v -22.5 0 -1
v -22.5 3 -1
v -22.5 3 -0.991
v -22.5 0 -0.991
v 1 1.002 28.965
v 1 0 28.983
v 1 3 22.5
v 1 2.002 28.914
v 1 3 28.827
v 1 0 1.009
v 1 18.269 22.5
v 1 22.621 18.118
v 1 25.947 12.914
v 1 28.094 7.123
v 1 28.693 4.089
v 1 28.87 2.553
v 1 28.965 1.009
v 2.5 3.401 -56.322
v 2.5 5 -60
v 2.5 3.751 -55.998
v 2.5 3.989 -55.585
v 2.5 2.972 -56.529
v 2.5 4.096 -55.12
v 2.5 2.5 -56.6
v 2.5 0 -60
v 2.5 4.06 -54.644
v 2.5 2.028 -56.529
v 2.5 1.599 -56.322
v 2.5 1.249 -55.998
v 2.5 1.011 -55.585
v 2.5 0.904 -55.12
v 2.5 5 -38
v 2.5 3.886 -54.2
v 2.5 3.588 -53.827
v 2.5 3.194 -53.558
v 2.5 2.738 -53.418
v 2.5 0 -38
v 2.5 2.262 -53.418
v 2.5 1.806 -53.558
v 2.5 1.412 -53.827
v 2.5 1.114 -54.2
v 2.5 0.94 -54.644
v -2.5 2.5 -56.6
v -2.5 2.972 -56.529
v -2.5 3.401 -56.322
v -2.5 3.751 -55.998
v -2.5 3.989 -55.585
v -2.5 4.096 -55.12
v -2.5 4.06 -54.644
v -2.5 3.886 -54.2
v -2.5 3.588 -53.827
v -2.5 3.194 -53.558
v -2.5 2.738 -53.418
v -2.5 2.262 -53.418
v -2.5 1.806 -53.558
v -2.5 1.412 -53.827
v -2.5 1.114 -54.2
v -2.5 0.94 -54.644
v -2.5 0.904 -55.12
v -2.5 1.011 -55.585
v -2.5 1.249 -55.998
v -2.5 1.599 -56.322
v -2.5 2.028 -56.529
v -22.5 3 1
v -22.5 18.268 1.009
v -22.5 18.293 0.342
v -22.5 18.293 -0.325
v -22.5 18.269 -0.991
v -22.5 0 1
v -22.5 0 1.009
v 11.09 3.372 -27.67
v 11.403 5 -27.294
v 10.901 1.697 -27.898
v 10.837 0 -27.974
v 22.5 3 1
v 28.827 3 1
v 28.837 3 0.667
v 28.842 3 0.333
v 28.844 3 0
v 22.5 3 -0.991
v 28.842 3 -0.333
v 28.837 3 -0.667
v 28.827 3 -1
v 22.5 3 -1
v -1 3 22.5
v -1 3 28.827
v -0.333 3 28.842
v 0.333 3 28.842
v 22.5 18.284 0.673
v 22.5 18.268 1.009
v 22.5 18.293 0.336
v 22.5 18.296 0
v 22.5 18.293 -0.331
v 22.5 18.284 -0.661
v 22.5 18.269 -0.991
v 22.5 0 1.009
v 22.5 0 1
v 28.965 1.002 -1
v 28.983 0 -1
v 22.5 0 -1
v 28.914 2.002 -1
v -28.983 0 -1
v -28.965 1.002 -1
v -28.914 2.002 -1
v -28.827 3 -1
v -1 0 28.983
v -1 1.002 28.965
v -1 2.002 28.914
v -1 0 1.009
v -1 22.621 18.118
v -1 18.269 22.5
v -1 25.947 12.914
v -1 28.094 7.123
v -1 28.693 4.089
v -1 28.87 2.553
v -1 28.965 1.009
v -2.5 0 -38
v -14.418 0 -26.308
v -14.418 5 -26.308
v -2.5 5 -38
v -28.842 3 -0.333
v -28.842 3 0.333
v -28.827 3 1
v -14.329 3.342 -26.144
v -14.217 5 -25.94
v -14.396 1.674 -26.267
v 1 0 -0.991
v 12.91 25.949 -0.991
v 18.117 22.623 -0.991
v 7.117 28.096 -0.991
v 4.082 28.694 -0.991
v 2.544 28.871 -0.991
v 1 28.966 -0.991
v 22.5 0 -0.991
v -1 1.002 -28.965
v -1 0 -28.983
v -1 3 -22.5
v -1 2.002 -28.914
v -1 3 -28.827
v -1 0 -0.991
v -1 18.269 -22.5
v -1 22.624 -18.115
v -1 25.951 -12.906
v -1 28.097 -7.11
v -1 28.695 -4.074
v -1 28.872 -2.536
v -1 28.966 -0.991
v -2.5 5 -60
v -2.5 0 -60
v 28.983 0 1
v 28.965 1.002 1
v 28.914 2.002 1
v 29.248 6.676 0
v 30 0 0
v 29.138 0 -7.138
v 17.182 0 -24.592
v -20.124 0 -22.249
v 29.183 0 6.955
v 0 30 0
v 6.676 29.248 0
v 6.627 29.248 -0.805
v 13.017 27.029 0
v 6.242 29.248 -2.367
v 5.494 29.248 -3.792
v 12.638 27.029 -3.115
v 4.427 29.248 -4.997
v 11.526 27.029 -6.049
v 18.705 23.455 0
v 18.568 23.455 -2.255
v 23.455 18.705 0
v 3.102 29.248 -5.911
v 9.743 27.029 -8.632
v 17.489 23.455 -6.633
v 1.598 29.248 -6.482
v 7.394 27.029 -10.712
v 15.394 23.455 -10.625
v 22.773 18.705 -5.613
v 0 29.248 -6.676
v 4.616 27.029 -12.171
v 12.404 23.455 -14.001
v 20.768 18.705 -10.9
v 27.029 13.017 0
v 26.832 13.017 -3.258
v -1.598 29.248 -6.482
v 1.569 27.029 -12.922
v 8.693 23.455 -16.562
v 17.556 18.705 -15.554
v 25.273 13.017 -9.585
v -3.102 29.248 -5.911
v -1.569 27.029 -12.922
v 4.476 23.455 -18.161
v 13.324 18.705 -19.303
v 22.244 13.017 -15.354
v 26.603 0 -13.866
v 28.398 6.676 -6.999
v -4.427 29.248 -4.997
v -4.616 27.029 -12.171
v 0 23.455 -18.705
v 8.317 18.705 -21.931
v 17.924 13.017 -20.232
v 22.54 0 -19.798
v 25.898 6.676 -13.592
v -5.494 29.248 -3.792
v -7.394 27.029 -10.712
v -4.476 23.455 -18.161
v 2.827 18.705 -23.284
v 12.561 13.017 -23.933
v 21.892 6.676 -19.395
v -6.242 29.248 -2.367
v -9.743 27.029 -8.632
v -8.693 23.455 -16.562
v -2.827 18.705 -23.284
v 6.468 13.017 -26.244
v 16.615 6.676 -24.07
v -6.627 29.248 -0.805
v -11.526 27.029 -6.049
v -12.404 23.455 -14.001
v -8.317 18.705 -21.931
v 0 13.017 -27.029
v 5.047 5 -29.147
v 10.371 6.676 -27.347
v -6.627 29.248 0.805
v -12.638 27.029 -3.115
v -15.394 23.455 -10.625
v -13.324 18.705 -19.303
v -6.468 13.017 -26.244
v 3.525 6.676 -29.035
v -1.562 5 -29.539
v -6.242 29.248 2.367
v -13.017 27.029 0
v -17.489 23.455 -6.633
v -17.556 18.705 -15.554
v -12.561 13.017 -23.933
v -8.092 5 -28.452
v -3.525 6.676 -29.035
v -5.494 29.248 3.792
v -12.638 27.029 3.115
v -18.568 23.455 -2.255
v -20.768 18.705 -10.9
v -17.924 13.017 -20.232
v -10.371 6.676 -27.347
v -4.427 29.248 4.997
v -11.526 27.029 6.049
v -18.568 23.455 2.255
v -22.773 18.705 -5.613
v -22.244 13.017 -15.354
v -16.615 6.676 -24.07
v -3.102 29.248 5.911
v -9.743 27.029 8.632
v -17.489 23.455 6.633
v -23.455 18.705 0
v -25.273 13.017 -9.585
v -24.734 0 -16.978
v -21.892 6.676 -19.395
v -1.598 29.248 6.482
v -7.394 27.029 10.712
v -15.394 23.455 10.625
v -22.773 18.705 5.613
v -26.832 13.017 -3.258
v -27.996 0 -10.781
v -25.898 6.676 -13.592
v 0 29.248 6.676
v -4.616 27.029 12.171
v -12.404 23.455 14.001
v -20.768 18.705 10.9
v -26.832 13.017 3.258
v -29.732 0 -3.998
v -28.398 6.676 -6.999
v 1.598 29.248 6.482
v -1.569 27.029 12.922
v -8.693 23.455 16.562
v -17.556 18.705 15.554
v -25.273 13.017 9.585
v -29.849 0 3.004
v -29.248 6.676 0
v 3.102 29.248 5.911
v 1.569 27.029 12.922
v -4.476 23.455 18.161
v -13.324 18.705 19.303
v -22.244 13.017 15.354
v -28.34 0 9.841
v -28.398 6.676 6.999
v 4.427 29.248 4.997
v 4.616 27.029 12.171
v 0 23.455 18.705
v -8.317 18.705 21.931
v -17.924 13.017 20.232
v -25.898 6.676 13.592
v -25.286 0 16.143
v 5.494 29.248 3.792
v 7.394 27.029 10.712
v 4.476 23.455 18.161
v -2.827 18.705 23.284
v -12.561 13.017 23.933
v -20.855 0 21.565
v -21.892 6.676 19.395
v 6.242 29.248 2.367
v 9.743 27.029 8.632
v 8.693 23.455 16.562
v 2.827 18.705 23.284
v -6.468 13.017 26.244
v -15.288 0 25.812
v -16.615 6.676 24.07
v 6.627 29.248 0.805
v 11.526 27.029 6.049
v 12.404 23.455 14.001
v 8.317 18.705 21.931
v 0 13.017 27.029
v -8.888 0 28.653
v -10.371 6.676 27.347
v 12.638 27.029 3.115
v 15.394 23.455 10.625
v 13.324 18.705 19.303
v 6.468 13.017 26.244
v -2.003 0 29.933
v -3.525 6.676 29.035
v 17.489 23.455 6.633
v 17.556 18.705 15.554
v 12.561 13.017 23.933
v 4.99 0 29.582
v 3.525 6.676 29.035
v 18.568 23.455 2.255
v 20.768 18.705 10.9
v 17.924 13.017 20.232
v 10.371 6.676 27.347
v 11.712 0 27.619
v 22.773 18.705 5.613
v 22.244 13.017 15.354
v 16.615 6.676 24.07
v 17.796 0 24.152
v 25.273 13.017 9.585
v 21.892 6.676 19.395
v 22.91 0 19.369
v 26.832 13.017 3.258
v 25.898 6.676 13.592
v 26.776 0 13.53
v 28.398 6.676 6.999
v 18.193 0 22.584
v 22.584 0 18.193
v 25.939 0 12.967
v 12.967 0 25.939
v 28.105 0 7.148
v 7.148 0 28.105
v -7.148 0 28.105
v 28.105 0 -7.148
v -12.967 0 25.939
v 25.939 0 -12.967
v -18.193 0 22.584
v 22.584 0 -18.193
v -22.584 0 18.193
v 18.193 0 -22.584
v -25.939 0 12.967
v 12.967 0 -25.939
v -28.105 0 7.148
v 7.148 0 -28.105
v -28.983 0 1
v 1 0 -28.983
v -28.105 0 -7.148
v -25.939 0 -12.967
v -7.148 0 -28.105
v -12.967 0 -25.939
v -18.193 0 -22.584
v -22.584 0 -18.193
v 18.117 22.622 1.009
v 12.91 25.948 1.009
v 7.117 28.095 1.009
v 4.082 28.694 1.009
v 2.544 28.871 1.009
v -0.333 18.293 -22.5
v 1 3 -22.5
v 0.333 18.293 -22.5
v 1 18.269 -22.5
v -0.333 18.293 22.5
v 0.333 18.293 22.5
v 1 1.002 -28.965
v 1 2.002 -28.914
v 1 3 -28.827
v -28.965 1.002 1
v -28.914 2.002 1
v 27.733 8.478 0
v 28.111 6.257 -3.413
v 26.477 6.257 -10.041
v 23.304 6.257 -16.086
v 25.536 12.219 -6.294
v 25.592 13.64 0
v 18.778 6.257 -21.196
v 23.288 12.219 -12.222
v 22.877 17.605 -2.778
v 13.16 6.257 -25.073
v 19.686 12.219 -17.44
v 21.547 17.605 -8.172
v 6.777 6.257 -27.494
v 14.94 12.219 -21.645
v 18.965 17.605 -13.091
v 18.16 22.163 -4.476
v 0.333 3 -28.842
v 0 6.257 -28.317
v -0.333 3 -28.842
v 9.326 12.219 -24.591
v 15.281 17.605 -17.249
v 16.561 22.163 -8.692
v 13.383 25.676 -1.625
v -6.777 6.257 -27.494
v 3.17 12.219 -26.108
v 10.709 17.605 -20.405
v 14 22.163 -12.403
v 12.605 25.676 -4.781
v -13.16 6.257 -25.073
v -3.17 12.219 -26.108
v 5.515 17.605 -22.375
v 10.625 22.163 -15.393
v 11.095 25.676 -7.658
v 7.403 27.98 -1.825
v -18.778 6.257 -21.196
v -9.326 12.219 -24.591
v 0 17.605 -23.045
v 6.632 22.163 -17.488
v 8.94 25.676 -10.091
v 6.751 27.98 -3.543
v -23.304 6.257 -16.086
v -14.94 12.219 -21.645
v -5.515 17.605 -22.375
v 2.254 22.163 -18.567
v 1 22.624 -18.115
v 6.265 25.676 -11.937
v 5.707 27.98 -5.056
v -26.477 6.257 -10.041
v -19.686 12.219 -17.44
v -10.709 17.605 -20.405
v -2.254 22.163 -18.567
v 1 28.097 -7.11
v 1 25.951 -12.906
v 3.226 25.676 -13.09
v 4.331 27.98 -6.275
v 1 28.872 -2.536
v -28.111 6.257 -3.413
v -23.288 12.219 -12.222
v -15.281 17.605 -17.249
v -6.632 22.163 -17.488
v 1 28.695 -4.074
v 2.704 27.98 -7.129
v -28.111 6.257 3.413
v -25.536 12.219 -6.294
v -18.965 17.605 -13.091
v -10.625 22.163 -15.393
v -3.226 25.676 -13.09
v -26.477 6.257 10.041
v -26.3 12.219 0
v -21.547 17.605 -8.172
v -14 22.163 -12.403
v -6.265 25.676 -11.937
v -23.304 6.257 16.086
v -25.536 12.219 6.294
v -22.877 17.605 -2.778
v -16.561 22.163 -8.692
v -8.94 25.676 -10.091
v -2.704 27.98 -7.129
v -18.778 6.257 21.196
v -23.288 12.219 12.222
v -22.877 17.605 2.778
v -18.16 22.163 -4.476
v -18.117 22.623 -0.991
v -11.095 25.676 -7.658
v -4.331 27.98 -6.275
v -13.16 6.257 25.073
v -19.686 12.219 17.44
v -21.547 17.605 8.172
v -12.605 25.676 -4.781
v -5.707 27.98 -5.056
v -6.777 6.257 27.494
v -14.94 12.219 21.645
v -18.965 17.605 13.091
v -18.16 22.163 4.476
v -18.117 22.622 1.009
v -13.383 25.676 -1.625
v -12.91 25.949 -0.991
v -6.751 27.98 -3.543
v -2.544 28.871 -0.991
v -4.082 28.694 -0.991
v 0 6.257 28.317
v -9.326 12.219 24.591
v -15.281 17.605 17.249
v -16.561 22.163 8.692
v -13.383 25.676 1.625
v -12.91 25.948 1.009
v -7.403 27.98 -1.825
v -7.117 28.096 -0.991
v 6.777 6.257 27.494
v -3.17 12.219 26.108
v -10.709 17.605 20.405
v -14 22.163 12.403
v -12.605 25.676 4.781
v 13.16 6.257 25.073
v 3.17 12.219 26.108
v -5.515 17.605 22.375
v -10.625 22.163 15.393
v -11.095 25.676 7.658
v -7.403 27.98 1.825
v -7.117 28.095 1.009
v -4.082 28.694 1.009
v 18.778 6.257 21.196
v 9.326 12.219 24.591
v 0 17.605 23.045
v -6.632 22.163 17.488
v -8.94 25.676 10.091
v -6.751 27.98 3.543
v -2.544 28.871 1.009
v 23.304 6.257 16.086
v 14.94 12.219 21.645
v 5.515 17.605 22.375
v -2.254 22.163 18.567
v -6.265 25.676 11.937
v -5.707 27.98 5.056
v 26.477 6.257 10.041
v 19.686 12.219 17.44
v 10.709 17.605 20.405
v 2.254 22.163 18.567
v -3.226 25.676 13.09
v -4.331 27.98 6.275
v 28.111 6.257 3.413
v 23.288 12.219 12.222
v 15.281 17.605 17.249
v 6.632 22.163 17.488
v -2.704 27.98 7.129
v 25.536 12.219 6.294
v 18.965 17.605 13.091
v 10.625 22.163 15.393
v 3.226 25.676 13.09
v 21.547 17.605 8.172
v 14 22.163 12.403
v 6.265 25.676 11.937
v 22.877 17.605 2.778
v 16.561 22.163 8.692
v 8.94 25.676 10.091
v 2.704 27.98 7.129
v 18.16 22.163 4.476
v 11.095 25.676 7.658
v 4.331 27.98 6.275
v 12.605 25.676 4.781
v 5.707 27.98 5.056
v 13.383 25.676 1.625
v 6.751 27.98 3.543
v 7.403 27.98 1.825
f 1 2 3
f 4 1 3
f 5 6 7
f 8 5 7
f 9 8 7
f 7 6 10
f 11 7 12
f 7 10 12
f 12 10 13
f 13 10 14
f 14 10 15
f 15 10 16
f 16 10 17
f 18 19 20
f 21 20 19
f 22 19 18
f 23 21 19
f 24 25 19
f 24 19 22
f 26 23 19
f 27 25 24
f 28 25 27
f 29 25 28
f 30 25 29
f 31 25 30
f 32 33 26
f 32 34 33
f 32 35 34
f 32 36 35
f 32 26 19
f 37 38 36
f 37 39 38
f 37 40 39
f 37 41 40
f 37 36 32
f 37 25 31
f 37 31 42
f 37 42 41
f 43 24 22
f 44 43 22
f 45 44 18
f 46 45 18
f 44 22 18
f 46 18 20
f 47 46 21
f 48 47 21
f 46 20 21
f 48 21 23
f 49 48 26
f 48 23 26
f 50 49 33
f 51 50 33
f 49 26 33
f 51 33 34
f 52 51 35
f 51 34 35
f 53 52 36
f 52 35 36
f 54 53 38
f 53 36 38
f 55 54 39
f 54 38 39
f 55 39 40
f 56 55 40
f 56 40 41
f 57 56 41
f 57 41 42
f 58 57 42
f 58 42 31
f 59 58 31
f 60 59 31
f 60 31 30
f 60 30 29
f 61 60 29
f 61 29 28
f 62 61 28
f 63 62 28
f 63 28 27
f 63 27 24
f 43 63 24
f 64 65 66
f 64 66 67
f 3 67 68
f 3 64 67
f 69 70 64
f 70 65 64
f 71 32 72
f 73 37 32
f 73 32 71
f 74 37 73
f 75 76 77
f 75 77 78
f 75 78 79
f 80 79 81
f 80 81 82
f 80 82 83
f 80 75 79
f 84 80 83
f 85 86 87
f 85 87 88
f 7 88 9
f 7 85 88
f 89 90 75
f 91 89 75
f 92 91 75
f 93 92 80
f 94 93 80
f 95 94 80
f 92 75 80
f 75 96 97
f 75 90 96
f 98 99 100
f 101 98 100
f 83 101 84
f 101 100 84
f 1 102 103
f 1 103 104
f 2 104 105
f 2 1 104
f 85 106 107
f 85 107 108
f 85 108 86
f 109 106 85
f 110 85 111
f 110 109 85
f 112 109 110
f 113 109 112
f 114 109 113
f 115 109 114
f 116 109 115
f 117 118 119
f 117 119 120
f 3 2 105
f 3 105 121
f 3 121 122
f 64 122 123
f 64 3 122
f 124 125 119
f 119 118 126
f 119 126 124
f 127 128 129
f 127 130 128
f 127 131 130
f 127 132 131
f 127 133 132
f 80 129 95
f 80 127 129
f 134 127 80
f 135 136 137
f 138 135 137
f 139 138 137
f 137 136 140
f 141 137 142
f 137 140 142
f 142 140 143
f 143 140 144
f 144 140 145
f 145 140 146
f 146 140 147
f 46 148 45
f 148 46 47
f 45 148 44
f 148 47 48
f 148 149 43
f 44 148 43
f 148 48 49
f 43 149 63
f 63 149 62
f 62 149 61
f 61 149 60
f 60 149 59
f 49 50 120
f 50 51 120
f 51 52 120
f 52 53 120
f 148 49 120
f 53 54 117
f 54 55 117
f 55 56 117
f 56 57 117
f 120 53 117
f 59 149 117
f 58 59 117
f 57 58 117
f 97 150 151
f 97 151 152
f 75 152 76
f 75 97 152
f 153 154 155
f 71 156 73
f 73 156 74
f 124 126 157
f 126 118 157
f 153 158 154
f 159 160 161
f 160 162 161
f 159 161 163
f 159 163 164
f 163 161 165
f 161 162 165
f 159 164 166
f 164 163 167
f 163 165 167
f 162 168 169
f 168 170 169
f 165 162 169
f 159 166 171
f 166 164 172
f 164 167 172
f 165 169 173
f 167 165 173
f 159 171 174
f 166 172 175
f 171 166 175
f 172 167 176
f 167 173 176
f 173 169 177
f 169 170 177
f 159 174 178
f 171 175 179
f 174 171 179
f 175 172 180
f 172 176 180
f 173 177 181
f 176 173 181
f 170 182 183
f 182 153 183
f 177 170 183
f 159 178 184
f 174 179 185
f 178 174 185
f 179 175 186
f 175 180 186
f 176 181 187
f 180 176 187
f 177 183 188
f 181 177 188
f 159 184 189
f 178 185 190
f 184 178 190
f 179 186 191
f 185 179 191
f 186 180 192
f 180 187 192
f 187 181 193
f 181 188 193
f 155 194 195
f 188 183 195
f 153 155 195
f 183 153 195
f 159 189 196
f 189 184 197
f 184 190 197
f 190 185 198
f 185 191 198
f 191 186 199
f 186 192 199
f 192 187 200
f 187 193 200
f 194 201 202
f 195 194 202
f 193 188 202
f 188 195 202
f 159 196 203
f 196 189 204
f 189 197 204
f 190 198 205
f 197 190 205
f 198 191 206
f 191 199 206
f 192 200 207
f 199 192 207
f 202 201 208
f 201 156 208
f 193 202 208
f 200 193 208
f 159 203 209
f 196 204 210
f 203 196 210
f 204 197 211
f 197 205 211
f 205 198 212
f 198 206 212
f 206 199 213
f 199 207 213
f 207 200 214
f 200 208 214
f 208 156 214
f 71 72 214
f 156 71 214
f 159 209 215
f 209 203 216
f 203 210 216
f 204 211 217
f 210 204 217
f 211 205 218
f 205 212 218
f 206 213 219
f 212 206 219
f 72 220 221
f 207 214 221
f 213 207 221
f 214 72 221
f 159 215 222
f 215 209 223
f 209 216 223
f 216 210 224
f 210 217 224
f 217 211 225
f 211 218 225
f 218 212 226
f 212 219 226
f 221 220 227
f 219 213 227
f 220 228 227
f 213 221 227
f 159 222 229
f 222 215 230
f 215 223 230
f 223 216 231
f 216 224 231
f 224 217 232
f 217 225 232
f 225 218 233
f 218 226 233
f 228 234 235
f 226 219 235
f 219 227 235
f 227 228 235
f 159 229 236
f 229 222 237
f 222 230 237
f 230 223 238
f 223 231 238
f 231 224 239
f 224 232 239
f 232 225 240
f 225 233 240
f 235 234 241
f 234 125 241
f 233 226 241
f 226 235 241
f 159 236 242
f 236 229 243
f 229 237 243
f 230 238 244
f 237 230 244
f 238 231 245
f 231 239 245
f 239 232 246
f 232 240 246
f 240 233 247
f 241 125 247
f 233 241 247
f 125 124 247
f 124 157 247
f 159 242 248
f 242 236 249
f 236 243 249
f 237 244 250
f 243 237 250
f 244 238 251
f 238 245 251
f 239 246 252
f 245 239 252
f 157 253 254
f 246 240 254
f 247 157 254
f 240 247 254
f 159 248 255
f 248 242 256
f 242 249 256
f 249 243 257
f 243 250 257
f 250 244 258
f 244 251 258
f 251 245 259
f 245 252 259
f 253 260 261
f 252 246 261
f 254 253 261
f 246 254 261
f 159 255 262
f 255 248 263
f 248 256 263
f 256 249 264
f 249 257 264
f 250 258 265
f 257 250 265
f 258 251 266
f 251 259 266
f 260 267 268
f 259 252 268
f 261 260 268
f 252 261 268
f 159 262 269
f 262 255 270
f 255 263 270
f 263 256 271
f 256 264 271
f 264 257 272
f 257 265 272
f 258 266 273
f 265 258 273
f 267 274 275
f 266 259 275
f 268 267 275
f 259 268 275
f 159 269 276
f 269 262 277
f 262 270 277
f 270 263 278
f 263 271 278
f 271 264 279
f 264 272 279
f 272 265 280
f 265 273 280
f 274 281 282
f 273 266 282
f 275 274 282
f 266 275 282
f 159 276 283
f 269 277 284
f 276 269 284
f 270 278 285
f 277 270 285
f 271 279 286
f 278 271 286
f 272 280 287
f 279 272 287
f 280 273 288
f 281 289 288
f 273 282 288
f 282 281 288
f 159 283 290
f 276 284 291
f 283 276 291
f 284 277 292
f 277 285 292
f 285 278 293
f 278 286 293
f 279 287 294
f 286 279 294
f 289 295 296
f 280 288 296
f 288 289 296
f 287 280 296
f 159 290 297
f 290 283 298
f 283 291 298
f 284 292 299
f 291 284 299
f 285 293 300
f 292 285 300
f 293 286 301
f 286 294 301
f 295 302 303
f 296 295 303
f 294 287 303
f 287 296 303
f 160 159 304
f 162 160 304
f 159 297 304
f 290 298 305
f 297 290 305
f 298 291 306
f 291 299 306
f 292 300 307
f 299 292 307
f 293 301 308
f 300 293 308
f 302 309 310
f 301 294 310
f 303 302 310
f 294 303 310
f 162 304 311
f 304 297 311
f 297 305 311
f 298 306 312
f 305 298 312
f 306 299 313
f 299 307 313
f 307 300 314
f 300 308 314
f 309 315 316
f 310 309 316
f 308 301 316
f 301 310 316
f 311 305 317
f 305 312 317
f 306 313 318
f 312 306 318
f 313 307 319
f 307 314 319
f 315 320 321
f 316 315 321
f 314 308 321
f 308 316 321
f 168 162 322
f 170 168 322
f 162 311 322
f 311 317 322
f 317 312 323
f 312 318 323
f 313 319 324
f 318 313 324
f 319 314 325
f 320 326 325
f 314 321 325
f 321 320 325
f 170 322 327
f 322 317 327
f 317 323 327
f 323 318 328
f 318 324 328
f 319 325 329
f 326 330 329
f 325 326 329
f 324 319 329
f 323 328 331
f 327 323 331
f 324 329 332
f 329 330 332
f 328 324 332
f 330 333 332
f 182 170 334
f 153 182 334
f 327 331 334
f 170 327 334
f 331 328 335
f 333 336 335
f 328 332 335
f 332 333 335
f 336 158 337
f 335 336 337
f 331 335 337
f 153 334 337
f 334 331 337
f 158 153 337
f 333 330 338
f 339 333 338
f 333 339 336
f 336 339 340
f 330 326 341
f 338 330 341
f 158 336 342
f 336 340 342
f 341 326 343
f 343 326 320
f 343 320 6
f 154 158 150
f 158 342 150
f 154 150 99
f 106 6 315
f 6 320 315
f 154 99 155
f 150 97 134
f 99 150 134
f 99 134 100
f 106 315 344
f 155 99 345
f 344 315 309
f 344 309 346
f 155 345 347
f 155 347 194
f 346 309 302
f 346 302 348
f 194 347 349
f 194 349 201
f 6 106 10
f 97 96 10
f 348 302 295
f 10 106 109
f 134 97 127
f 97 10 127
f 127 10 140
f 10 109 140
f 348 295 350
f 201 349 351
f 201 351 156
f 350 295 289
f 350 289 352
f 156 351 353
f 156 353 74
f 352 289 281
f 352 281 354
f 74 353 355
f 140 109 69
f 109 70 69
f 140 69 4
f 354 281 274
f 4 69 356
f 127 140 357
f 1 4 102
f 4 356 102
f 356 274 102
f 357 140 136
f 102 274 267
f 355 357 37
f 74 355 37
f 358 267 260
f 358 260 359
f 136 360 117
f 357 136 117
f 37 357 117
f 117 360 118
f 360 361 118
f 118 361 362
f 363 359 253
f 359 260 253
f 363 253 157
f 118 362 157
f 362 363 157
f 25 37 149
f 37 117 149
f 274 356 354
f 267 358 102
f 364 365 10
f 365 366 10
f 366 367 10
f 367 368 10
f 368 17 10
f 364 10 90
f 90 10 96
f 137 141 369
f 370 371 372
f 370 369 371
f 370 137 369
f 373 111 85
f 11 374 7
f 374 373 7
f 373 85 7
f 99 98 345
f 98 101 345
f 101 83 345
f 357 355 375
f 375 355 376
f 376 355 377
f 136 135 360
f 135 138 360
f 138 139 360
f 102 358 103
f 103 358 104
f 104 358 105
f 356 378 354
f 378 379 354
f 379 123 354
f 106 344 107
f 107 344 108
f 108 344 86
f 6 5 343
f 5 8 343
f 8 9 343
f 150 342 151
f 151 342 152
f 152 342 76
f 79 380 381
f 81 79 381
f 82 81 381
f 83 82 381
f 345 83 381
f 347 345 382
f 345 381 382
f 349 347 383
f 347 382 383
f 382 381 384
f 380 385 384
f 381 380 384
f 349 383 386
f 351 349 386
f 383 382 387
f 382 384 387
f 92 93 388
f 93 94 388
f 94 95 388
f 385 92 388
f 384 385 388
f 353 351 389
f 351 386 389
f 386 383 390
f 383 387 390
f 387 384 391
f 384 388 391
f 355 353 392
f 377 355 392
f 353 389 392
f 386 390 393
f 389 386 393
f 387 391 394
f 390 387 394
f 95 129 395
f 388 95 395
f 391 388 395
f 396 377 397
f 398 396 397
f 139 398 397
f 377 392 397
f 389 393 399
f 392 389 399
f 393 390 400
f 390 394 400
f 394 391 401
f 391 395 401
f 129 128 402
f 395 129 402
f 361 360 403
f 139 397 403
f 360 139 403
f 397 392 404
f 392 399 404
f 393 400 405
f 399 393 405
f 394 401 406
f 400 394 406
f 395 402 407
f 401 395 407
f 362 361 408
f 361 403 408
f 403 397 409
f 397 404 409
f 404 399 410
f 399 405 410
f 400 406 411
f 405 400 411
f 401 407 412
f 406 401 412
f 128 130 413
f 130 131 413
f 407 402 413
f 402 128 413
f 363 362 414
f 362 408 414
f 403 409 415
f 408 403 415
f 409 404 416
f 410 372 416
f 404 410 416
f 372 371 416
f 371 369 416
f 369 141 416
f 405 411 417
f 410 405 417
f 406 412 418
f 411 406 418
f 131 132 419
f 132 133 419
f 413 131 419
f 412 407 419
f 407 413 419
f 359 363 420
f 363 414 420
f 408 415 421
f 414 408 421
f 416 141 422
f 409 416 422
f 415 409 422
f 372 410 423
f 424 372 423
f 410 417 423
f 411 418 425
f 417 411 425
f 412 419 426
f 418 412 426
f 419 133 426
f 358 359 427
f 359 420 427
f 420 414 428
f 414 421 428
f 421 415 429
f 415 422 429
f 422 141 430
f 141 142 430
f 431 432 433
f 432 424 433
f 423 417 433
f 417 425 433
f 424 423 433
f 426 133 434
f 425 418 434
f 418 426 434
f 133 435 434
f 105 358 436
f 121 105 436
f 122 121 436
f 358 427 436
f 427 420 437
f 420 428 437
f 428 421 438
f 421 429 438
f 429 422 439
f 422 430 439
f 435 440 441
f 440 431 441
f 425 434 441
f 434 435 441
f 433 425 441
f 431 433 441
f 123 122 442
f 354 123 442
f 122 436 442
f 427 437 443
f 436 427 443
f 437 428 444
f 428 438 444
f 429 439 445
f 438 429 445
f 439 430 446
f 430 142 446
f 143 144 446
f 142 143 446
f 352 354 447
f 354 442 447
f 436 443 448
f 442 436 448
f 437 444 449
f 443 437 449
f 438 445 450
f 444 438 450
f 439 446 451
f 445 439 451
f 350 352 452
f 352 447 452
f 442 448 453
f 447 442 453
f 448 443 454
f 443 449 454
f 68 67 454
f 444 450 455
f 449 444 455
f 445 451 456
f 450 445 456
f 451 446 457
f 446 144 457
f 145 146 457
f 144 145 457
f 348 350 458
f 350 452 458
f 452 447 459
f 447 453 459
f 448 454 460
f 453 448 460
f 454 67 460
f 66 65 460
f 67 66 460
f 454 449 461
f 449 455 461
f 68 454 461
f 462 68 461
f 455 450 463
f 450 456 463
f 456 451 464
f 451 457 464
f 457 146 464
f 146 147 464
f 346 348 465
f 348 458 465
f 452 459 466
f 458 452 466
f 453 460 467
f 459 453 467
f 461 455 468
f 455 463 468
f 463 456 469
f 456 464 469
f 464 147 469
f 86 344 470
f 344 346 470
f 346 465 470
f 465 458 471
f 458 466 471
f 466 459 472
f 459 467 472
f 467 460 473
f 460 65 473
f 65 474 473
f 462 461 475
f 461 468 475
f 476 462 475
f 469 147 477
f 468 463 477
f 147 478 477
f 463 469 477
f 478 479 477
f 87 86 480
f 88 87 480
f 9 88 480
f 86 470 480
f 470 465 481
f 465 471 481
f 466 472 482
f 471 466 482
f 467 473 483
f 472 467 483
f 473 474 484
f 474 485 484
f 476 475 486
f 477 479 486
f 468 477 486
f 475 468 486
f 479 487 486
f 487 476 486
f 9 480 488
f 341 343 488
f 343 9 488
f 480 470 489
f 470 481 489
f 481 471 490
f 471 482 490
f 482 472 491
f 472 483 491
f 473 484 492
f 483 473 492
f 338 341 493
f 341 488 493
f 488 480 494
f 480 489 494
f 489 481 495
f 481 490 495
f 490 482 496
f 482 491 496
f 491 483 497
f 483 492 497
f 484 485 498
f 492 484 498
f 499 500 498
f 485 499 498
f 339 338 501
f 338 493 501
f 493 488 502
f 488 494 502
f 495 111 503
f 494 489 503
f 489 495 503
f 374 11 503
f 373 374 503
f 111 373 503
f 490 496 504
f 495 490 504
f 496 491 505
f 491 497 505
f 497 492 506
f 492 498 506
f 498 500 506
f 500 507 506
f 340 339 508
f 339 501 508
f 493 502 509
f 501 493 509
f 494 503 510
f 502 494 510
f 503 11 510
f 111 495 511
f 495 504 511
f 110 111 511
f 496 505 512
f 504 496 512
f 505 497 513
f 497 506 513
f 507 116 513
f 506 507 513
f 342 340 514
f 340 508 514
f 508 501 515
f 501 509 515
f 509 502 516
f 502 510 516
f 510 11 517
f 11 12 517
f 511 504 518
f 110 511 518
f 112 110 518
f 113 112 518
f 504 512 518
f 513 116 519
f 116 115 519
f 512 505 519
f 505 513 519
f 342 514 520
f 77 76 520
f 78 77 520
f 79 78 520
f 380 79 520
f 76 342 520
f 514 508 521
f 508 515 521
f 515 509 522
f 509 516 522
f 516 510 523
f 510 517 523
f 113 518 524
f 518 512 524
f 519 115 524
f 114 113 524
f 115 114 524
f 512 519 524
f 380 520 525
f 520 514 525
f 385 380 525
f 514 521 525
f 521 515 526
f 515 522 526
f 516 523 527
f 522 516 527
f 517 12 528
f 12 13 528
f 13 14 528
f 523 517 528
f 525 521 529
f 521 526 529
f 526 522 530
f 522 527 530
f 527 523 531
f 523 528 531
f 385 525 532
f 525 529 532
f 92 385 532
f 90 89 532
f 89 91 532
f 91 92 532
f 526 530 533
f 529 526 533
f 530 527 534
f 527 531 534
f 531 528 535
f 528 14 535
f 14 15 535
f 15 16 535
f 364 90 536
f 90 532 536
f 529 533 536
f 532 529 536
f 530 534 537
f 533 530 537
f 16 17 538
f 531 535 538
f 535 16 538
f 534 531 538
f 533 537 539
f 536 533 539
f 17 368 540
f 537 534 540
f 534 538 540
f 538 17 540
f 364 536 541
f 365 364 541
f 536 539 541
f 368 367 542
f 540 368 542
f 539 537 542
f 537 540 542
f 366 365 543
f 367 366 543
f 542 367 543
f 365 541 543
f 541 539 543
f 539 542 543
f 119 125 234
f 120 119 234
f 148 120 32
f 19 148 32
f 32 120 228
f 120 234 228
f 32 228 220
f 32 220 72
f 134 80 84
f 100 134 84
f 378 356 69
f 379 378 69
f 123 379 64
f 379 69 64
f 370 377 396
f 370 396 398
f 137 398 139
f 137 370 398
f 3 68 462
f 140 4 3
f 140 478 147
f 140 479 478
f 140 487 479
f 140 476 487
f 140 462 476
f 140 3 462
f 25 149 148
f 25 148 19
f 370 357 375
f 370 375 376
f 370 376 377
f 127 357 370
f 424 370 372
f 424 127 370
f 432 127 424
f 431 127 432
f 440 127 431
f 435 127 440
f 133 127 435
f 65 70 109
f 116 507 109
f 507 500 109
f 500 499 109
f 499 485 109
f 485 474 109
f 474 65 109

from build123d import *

# Parameters (mm, degrees)
BOSS_EXTRUDE1_DEPTH      = 5
SKETCH4_R                = 1.6
CUT_EXTRUDE1_DEPTH       = 75.540257579
BOSS_EXTRUDE2_REACH      = 75.485
BOSS_EXTRUDE2_END_RADIUS = 29
SKETCH5_W                = 2
SKETCH5_H                = 45
SKETCH5_W_2              = 45
SKETCH5_H_2              = 2
BOSS_EXTRUDE3_REACH      = 69.5
BOSS_EXTRUDE3_END_RADIUS = 29
SKETCH7_W                = 2
SKETCH7_H                = 3
CIRPATTERN1_COUNT        = 4


with BuildPart() as part:
    # Sketch2 → Revolve1 (revolve)
    with BuildSketch(Plane.XY):
        with BuildLine():
            Line((0, 29), (0, 30))
            ThreePointArc((0, 30), (21.213203436, 21.213203436), (30, 0))
            Line((30, 0), (29, 0))
            ThreePointArc((29, 0), (20.506096654, 20.506096654), (0, 29))
        make_face()
    revolve(axis=Axis((0, 0, 0), (0, 1, 0)))

    # Sketch3 → Boss-Extrude1 (add)
    with BuildSketch(Plane.XZ):
        with BuildLine():
            Line((-2.5, -38), (-2.5, -60))
            Line((-2.5, -60), (2.5, -60))
            Line((2.5, -60), (2.5, -38))
            Line((2.5, -38), (12.22277757, -26.308006594))
            Line((12.22277757, -26.308006594), (12.219091313, -26.300072385))
            ThreePointArc((12.219091313, -26.300072385), (-0.967100454, -29.109666297), (-13.937737405, -25.431073041))
            Line((-13.937737405, -25.431073041), (-14.41834904, -26.308006594))
            Line((-14.41834904, -26.308006594), (-2.5, -38))
        make_face()
    extrude(amount=-BOSS_EXTRUDE1_DEPTH)

    # Sketch4 → Cut-Extrude1 (cut, through all)
    with BuildSketch(Plane(origin=(2.5, 0, 0), x_dir=(0, 0, -1), z_dir=(1, 0, 0))):
        with Locations((55, 2.5)):
            Circle(SKETCH4_R)
    extrude(amount=-CUT_EXTRUDE1_DEPTH, mode=Mode.SUBTRACT)

    # Boss-Extrude2: up to this sphere (the profile starts inside it)
    boss_extrude2_end = Location((0, 0, 0)) * Sphere(BOSS_EXTRUDE2_END_RADIUS, mode=Mode.PRIVATE)
    # Sketch5 → Boss-Extrude2 (add, up to the surface)
    with BuildSketch(Plane(origin=(0, 0, 0), x_dir=(1, 0, 0), z_dir=(0, 1, 0)), mode=Mode.PRIVATE) as boss_extrude2_sk1:
        Rectangle(SKETCH5_W, SKETCH5_H)
    boss_extrude2_tool1 = extrude(boss_extrude2_sk1.sketch, amount=BOSS_EXTRUDE2_REACH, mode=Mode.PRIVATE) & boss_extrude2_end
    add(boss_extrude2_tool1.solids().sort_by_distance((0, 0, 0))[0])
    # Sketch5 → Boss-Extrude2 (add, up to the surface)
    with BuildSketch(Plane(origin=(0, 0, 0), x_dir=(1, 0, 0), z_dir=(0, 1, 0)), mode=Mode.PRIVATE) as boss_extrude2_sk2:
        with Locations((0, -0.008687273)):
            Rectangle(SKETCH5_W_2, SKETCH5_H_2)
    boss_extrude2_tool2 = extrude(boss_extrude2_sk2.sketch, amount=BOSS_EXTRUDE2_REACH, mode=Mode.PRIVATE) & boss_extrude2_end
    add(boss_extrude2_tool2.solids().sort_by_distance((0, 0, 0.008687))[0])

    # Boss-Extrude3: up to this sphere (the profile starts inside it)
    boss_extrude3_end = Location((0, 0, 0)) * Sphere(BOSS_EXTRUDE3_END_RADIUS, mode=Mode.PRIVATE)
    # Sketch7 → Boss-Extrude3 (add, up to the surface)
    with BuildSketch(Plane(origin=(0, 0, -22.5), x_dir=(-1, 0, 0), z_dir=(0, 0, -1)), mode=Mode.PRIVATE) as boss_extrude3_sk1:
        with Locations((0, 1.5)):
            Rectangle(SKETCH7_W, SKETCH7_H)
    boss_extrude3_tool1 = extrude(boss_extrude3_sk1.sketch, amount=BOSS_EXTRUDE3_REACH, mode=Mode.PRIVATE) & boss_extrude3_end
    boss_extrude3 = boss_extrude3_tool1.solids().sort_by_distance((0, 1.5, -22.5))[0]
    add(boss_extrude3)

    # CirPattern1: Boss-Extrude3 ×4 about axis
    cirpattern1_axis = Axis((0, 0, 0), (0, -1, 0))
    for i in range(1, CIRPATTERN1_COUNT):
        add(boss_extrude3.rotate(cirpattern1_axis, i * 360 / CIRPATTERN1_COUNT))


solid = part.part
